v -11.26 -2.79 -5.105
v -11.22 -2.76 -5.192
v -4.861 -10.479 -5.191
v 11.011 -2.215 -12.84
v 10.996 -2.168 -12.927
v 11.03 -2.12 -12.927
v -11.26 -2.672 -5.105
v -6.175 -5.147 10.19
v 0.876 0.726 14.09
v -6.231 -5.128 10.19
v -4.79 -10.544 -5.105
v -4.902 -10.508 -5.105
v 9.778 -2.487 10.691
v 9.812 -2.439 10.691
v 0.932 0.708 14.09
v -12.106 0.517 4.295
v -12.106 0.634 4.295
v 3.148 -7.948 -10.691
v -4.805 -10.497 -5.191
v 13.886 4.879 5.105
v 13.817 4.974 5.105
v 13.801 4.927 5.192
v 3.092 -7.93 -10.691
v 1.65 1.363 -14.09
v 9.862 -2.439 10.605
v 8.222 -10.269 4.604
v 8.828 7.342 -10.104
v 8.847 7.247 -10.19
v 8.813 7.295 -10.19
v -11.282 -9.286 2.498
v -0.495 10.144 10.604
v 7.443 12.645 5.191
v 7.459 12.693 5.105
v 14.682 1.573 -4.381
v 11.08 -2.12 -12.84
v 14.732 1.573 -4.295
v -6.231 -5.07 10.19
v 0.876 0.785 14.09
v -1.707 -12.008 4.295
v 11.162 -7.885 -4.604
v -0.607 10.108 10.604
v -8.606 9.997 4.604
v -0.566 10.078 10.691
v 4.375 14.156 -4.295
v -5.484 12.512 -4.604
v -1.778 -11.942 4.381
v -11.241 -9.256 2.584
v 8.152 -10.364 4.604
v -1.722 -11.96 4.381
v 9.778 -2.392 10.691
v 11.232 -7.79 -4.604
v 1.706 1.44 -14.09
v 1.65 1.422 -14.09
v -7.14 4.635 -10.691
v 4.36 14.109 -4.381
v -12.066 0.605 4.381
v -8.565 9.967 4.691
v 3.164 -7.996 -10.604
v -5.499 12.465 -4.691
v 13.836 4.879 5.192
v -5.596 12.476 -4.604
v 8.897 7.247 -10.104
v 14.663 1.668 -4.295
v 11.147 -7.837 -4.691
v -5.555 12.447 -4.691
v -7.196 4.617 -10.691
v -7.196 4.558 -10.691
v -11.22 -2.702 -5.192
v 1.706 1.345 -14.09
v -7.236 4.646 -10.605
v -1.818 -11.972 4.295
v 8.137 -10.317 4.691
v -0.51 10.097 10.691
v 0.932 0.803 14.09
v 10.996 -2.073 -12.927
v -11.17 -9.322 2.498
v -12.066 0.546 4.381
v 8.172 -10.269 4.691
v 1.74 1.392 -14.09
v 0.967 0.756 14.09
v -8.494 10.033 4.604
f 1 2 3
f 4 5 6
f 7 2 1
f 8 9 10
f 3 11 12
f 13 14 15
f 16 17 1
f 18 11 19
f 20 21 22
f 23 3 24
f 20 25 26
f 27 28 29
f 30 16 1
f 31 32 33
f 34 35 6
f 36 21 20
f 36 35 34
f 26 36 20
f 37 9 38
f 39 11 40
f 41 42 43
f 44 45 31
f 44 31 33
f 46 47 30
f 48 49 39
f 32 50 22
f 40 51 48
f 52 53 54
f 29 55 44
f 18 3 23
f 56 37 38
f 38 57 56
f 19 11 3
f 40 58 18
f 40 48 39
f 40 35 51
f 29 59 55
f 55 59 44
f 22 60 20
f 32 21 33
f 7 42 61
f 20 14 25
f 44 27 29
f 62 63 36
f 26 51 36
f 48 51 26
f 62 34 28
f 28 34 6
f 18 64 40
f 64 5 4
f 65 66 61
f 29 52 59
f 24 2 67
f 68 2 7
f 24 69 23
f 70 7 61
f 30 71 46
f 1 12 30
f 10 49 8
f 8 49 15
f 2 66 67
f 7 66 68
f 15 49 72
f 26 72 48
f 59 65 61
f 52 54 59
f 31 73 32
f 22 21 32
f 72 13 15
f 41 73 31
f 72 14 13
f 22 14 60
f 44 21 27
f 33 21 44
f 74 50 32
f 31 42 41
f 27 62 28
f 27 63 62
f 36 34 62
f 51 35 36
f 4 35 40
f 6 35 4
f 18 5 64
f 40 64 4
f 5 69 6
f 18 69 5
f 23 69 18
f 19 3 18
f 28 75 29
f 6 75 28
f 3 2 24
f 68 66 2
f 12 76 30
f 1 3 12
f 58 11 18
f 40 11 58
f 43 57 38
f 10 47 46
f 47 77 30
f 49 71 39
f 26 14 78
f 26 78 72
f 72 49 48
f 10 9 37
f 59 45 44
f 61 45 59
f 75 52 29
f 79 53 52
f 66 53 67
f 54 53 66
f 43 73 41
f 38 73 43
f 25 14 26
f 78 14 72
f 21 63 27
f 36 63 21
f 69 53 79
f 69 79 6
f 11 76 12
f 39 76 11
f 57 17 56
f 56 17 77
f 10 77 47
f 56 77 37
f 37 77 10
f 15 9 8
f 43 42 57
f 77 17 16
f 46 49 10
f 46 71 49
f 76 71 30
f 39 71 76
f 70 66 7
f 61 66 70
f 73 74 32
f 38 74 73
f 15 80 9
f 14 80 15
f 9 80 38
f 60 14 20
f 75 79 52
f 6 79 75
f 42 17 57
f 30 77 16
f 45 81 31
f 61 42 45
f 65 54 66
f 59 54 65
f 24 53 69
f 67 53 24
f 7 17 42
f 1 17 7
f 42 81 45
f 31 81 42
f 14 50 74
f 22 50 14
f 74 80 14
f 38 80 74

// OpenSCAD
// Auto-generated OpenSCAD file

    inner_points = 10*[[-0.4820813211250987, -1.0449238650604131, -0.5104799034334353], [-0.052587296473702555, 1.0049095944004596, 1.060449642253799], [0.3132765628671369, -0.7900923074517557, -1.060449642253799], [0.7427705875185331, 1.259741152009117, 0.5104799034334353], [0.8121529711437319, -1.026904669604844, 0.4604304395233323], [0.9762050905955799, -0.24393795936757026, 1.060472132044425], [-0.7155158242021455, 0.4587552463162742, -1.060472132044425], [-0.5514637047502975, 1.241721956553548, -0.4604304395233323], [-0.6190335754244582, -0.5099059922176972, 1.010386278888689], [1.4632403980874105, 0.15725168700784506, -0.4294531901269253], [-1.2025511316939763, 0.05756559994085883, 0.4294531901269253], [0.8797228418178926, 0.7247232791664011, -1.010386278888689], [-0.1737587446246939, -1.191281953827171, 0.4294756799175514], [0.09168316057485429, 0.07558479539642826, 1.400363533083693], [1.1131573448949394, -0.7789558322102864, -0.4603940502776995], [1.3785992500944875, 0.487910917013313, 0.5104938028884421], [-1.1179099837010533, -0.27309363006460907, -0.5104938028884421], [-0.8524680785015052, 0.9937731191589904, 0.4603940502776995], [0.16900610581858003, 0.13923249155227563, -1.400363533083693], [0.43444801101812824, 1.406099240775875, -0.4294756799175514], [-1.1201047009544618, -0.9226987816684733, 0.249774787956858], [1.0980326190753988, -0.212010675559726, -1.284010728119616]];

    outer_points = 10*[[0.3553738060072703, 1.340954088422547, 0.19767924096673445], [0.5163570327909294, -1.270590953937949, 0.28722732116012484], [-0.5163570327909294, 1.270590953937949, -0.28722732116012484], [-0.3553738060072703, -1.340954088422547, -0.19767924096673445], [-0.6670731664763409, 0.4987607215152127, 1.1268436558827821], [-0.6055830454636154, -0.4987607215152127, 1.161047978889356], [0.6055830454636154, 0.4987607215152127, -1.161047978889356], [0.6670731664763409, -0.4987607215152127, -1.1268436558827821], [0.8980547740238846, 0.09210653881782889, 1.071699351461188], [-1.3841661909912581, -0.09210653881782889, -0.19780250955479217], [1.3841661909912581, 0.09210653881782889, 0.19780250955479217], [-0.8980547740238846, -0.09210653881782889, -1.071699351461188], [0.26222611273671315, 0.863936771240565, 1.0716231672840233], [0.36171921850764677, -0.7500868280895054, 1.1269669244708398], [-1.1482640134802296, 0.7500868280895054, 0.28702786839490235], [-1.048770907709296, -0.863936771240565, 0.34237162558171885], [1.048770907709296, 0.863936771240565, -0.34237162558171885], [1.1482640134802296, -0.7500868280895054, -0.28702786839490235], [-0.36171921850764677, 0.7500868280895054, -1.1269669244708398], [-0.26222611273671315, -0.863936771240565, -1.0716231672840233], [1.162572789567373, 0.9577836380236123, 0.6466894935006993], [-1.2685575801393754, 0.7615511020849973, -0.7056442971472661]];

    // Convex hull for inner set (I)
    module inner_hull() {
        hull() {
            for (p = inner_points) {
                translate(p) sphere(r=0.1);
            }
        }
    }

    // Convex hull for outer set (O) minus inner hull (O \ I)
    module outer_minus_inner() {
        difference() {
            hull() {
                for (p = outer_points) {
                    translate(p) sphere(r=0.1);
                }
            }
            inner_hull(); // Subtract inner hull
        }
    }

    // Convex hull for outer set (O) minus all translated inner hulls
    module outer_minus_AllTranslationInner() {
        difference() {
            hull() {
                for (p = outer_points) {
                    translate(p) sphere(r=0.1);
                }
            }
            hull() {
                translate([0,0,50]) inner_hull();
                translate([0,0,-50]) inner_hull();
            }; // Subtract translated inner hulls
        }
    }

    // Difference between outer_minus_inner and outer_minus_AllTranslationInner
    module outer_minus_inner_diff() {
        difference() {
            // Outer minus inner
            difference() {
                hull() {
                    for (p = outer_points) {
                        translate(p) sphere(r=0.1);
                    }
                }
                inner_hull();
            }

            // Subtract Outer minus AllTranslationInner
            difference() {
                hull() {
                    for (p = outer_points) {
                        translate(p) sphere(r=0.1);
                    }
                }
                hull() {
                    translate([0,0,50]) inner_hull();
                    translate([0,0,-50]) inner_hull();
                };
            }
        }
    }

    // Rendering all with colors applied
    color([1, 0, 0, 0.5]) inner_hull(); // Transparent red
    
